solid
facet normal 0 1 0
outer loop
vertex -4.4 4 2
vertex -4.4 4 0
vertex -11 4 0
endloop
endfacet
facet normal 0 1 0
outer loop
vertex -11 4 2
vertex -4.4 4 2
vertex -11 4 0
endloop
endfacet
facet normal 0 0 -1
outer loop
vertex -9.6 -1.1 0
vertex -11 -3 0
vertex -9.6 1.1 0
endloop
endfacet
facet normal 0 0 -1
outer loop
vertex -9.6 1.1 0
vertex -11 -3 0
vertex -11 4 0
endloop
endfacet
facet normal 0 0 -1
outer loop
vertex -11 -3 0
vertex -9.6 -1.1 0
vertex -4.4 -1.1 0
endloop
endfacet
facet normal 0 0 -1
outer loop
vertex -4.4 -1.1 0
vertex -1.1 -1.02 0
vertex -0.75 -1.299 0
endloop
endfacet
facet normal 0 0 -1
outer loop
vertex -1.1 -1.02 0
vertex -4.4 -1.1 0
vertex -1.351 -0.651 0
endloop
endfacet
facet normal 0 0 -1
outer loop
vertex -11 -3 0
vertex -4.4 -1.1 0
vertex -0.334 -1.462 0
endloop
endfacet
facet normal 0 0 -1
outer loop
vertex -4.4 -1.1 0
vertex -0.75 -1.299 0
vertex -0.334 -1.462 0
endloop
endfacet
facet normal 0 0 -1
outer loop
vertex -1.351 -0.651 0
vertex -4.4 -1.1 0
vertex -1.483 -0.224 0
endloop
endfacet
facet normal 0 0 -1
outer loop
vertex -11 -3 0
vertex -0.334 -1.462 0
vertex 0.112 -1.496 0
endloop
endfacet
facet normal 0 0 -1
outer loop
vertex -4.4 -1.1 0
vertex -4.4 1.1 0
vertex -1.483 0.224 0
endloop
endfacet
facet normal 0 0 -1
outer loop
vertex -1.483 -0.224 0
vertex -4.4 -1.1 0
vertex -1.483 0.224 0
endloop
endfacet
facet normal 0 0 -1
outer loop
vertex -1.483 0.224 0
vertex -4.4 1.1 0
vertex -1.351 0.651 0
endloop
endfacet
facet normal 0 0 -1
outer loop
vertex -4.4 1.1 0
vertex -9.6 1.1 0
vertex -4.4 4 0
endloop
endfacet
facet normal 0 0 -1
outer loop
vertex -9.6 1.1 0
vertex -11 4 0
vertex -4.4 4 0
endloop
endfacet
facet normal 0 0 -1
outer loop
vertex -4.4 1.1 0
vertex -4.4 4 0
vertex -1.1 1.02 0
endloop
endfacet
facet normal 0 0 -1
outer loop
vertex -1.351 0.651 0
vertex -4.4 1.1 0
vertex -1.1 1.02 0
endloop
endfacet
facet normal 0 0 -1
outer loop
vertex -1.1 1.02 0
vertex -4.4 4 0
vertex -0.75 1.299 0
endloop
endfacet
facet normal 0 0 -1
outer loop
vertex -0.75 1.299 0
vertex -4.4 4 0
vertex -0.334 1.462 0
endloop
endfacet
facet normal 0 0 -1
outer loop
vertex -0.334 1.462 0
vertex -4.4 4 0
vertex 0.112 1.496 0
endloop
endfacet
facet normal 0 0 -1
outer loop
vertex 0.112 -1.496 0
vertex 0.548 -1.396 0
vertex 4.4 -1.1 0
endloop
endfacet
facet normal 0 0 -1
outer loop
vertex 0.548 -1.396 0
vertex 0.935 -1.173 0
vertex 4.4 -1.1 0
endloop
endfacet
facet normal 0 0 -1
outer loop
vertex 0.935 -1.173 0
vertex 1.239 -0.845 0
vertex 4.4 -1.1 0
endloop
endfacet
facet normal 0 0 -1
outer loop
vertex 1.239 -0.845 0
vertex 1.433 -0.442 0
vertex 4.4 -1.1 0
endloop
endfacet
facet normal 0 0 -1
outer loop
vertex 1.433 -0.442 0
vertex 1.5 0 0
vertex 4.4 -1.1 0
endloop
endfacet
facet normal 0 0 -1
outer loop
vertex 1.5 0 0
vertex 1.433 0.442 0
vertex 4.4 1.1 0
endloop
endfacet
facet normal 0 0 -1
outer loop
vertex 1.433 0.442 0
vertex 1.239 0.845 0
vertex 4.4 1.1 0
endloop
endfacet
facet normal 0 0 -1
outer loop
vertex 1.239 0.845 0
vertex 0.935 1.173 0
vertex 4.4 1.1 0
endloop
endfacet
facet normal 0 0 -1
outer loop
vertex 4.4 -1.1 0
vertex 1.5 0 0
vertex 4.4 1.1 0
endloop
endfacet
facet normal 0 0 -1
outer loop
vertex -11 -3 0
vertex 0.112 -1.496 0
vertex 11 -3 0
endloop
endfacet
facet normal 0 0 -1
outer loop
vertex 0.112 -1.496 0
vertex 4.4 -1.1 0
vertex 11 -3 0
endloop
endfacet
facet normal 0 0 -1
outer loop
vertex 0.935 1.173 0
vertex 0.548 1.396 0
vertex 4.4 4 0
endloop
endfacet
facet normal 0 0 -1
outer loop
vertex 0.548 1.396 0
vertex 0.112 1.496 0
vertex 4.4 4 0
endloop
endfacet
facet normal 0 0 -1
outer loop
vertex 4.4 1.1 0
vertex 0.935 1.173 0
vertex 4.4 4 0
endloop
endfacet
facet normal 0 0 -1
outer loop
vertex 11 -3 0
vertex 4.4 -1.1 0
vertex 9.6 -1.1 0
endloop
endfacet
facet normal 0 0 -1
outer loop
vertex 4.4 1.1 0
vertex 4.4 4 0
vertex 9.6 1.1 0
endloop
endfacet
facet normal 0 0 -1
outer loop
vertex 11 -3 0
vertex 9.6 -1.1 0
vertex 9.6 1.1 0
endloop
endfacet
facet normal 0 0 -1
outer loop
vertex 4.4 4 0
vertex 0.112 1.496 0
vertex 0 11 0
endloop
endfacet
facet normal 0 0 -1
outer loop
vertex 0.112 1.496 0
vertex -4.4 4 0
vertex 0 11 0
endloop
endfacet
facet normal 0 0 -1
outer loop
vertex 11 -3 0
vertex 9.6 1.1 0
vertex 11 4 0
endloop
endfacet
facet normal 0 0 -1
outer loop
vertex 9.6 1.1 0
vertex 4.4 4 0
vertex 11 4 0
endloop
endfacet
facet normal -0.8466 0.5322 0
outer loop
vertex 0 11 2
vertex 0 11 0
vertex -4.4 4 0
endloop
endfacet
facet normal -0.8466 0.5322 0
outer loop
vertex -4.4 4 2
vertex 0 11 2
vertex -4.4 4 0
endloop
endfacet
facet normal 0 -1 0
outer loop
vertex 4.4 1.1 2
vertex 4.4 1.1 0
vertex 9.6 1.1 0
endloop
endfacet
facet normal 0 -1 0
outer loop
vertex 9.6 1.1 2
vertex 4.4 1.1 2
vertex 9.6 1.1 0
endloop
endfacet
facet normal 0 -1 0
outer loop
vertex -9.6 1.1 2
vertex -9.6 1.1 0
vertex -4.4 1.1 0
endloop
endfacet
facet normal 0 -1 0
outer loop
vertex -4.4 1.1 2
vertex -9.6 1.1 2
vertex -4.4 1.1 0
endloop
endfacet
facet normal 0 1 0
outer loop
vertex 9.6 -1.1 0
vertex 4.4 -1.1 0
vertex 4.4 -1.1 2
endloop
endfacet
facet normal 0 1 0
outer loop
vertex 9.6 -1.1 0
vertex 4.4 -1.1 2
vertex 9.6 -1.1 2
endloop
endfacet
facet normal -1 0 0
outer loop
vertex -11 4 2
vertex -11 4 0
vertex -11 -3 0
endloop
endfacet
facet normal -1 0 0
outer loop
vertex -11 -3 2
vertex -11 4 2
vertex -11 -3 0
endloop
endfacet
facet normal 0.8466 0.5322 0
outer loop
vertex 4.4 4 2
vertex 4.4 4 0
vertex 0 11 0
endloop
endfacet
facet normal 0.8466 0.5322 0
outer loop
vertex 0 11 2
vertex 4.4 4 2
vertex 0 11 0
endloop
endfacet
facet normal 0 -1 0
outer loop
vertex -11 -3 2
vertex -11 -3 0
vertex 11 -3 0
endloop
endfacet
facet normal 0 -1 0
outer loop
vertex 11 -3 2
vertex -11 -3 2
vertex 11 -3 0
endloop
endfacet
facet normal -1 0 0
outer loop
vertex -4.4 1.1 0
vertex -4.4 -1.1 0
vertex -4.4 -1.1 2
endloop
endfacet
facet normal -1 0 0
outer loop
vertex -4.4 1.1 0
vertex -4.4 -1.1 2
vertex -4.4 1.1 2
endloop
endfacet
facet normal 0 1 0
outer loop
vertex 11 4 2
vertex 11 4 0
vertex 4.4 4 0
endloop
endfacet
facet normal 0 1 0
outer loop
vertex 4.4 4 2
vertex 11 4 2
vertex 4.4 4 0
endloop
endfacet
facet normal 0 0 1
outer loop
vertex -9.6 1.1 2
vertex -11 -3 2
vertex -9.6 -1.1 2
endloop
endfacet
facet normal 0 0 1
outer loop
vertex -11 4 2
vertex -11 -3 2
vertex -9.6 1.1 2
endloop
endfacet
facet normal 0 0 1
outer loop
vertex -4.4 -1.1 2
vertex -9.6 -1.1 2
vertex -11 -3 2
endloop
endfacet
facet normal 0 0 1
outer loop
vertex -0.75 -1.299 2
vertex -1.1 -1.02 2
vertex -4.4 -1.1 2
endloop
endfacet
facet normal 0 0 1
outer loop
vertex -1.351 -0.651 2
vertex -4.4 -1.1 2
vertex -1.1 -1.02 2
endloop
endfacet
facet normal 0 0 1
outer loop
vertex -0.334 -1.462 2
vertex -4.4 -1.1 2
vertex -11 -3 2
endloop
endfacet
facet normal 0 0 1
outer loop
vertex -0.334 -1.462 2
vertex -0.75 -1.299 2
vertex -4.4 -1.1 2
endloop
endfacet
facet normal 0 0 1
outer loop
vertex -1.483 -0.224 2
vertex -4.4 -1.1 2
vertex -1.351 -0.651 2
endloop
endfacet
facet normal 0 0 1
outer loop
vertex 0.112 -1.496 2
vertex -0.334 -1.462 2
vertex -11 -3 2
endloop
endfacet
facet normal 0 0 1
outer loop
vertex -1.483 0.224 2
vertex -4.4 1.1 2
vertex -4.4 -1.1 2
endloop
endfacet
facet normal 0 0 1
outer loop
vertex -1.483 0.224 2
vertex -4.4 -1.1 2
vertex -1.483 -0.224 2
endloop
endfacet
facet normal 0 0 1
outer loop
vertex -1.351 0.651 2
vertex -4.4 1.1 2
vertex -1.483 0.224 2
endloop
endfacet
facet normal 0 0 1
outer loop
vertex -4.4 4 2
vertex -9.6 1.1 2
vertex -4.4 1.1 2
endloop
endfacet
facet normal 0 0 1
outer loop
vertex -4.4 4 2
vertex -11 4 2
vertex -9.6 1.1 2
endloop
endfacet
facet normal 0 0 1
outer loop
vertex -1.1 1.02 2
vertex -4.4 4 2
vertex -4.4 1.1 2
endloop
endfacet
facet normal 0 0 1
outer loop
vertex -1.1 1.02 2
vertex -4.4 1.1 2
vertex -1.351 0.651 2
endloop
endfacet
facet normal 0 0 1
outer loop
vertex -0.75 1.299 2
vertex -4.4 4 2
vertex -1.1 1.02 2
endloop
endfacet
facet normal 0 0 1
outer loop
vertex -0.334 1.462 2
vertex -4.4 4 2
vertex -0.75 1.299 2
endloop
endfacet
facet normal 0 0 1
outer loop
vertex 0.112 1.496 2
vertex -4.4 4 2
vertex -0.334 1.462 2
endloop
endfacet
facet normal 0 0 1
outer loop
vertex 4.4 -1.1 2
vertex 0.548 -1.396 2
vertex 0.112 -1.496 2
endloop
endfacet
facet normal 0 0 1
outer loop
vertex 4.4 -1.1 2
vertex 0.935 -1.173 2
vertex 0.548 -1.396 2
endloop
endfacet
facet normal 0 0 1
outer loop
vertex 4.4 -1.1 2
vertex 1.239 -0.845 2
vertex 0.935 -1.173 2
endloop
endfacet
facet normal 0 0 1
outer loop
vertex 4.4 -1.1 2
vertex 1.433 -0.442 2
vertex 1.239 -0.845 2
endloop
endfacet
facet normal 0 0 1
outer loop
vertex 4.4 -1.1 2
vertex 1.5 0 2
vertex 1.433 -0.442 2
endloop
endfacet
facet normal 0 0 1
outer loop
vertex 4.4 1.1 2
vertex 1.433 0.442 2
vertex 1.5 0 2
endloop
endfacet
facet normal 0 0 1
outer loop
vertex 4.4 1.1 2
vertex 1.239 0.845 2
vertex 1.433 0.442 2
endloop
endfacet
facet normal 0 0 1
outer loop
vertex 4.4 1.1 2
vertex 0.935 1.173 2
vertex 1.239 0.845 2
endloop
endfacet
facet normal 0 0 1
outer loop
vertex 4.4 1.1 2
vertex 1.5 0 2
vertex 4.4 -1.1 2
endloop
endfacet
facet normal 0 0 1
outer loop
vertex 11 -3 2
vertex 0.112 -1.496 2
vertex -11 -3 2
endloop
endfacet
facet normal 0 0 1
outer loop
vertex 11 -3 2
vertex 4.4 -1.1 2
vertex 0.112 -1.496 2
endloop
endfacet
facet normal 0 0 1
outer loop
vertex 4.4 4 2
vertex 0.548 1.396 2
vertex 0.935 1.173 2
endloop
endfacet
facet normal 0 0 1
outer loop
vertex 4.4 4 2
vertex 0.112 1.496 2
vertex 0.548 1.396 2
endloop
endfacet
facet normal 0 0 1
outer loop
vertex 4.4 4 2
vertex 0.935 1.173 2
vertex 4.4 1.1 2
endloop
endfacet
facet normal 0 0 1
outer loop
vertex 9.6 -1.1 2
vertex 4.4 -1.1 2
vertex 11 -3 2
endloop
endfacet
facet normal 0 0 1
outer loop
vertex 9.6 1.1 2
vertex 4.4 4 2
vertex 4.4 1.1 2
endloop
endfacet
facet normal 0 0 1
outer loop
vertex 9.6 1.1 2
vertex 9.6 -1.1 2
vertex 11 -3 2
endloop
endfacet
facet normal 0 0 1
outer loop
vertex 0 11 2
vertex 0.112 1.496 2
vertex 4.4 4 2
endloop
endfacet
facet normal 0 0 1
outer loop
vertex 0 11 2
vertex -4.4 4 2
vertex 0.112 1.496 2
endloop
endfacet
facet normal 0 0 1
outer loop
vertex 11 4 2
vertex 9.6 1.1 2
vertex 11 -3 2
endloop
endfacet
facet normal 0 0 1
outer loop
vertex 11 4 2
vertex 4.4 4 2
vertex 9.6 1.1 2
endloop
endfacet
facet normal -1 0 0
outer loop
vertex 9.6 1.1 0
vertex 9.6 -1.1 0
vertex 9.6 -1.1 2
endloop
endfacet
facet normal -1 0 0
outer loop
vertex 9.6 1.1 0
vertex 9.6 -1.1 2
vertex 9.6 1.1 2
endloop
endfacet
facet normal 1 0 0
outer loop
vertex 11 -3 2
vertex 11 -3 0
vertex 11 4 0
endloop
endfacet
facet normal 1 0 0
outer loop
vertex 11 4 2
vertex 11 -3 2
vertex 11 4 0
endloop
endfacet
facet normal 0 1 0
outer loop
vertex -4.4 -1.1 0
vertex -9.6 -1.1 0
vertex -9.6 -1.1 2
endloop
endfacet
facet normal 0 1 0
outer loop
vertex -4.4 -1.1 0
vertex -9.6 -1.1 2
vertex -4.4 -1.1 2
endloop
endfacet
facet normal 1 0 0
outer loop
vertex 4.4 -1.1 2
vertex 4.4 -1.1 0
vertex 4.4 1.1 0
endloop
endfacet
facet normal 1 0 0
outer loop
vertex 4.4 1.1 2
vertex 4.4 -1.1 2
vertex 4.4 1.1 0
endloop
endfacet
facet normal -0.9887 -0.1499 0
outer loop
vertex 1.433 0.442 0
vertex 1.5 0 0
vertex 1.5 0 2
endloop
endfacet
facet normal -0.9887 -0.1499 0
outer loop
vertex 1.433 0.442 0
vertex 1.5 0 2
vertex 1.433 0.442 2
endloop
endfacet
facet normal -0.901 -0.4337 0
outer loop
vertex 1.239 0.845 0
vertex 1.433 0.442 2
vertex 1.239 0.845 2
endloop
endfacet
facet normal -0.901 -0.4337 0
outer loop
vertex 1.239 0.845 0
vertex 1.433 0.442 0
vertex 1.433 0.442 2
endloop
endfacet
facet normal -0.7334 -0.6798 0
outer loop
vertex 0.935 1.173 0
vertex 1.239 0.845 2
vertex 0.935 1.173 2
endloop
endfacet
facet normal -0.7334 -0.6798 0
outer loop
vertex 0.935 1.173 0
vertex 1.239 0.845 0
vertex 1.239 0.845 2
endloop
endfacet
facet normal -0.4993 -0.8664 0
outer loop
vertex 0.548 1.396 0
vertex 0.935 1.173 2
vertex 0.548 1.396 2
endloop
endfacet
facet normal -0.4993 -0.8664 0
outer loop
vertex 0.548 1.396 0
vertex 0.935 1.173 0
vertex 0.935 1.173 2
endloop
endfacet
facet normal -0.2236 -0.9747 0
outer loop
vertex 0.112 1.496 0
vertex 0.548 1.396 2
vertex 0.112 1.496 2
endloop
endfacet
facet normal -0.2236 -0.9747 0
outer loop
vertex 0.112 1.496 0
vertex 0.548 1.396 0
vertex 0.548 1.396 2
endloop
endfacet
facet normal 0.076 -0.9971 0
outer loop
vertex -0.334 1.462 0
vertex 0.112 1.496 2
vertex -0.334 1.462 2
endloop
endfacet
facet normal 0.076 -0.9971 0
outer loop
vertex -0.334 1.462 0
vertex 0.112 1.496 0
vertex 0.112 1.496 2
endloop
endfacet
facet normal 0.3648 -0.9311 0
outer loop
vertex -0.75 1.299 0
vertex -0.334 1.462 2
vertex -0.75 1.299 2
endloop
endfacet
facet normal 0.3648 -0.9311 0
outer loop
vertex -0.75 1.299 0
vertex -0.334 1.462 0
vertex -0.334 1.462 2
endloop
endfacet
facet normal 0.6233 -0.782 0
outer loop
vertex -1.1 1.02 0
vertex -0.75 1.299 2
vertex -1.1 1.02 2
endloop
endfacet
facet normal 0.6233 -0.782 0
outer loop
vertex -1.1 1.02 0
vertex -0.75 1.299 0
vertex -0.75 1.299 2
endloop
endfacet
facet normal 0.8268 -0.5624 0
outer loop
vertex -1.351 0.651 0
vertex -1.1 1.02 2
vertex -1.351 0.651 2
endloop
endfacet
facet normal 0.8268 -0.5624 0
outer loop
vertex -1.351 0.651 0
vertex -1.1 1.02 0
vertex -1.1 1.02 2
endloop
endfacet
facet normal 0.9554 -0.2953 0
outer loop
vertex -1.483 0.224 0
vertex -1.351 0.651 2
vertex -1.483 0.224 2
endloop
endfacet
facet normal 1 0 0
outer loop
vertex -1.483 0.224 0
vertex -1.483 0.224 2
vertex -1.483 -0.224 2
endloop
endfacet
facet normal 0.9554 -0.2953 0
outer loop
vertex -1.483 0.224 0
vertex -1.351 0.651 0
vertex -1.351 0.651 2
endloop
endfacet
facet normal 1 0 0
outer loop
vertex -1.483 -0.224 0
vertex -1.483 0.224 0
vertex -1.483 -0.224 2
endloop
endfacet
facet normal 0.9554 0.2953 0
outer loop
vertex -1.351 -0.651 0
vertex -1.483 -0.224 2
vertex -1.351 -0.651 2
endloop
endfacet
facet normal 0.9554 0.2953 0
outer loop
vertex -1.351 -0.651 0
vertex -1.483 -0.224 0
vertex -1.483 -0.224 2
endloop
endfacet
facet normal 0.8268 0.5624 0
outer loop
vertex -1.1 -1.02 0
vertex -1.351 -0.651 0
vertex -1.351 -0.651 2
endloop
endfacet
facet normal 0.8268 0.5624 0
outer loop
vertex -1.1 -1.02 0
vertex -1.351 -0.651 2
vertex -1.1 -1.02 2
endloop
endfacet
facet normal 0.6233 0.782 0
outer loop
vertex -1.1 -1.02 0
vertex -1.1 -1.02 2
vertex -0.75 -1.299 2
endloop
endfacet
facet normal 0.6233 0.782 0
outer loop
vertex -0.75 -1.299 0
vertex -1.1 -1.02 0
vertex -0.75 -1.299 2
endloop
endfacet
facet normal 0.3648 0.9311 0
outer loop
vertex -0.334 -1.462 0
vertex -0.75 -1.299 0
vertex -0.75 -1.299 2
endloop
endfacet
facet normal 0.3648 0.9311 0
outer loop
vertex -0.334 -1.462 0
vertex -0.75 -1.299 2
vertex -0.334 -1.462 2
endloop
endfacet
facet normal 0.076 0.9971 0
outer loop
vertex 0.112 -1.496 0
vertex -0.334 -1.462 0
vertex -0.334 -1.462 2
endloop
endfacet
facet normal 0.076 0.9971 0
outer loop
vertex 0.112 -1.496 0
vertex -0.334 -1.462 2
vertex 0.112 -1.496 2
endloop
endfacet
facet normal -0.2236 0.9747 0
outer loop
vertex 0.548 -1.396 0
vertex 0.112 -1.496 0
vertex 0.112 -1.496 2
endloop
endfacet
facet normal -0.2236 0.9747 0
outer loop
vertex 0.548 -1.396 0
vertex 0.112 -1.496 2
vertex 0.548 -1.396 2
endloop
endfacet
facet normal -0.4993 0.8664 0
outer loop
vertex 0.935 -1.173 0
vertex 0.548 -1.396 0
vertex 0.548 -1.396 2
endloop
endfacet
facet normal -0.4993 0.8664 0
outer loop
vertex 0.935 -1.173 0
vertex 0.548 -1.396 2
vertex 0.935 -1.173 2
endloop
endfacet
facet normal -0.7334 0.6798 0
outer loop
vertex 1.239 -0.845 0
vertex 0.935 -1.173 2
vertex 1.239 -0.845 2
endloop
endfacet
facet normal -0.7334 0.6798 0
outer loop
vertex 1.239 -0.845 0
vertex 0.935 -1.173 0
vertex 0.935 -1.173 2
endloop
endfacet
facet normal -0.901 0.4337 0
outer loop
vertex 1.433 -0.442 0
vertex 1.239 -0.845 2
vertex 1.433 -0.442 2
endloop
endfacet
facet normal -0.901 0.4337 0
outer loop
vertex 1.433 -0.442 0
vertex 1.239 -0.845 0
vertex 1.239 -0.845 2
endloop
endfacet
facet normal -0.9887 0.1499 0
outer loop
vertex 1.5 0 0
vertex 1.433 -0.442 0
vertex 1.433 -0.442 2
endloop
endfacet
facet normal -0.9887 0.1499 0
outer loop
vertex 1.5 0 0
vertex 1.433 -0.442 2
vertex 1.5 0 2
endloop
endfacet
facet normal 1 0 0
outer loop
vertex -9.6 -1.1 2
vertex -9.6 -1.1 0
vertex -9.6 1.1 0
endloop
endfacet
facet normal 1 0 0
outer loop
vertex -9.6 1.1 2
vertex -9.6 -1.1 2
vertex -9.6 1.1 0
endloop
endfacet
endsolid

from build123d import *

# Parameters (mm, degrees)
SKETCH_1_R      = 1.5
SKETCH_1_W      = 5.2
SKETCH_1_H      = 2.2
EXTRUDE_1_DEPTH = 2


with BuildPart() as part:
    # 草图1 → 凸台-拉伸1 (new body)
    with BuildSketch(Plane.XY):
        Polygon((-11, 0), (-11, -3), (11, -3), (11, 0), (11, 4), (4.4, 4), (0, 11), (-4.4, 4), (-11, 4), align=None)
        Circle(SKETCH_1_R, mode=Mode.SUBTRACT)
        with Locations((7, 0)):
            Rectangle(SKETCH_1_W, SKETCH_1_H, mode=Mode.SUBTRACT)
        with Locations((-7, 0)):
            Rectangle(SKETCH_1_W, SKETCH_1_H, mode=Mode.SUBTRACT)
    extrude(amount=EXTRUDE_1_DEPTH)


solid = part.part
